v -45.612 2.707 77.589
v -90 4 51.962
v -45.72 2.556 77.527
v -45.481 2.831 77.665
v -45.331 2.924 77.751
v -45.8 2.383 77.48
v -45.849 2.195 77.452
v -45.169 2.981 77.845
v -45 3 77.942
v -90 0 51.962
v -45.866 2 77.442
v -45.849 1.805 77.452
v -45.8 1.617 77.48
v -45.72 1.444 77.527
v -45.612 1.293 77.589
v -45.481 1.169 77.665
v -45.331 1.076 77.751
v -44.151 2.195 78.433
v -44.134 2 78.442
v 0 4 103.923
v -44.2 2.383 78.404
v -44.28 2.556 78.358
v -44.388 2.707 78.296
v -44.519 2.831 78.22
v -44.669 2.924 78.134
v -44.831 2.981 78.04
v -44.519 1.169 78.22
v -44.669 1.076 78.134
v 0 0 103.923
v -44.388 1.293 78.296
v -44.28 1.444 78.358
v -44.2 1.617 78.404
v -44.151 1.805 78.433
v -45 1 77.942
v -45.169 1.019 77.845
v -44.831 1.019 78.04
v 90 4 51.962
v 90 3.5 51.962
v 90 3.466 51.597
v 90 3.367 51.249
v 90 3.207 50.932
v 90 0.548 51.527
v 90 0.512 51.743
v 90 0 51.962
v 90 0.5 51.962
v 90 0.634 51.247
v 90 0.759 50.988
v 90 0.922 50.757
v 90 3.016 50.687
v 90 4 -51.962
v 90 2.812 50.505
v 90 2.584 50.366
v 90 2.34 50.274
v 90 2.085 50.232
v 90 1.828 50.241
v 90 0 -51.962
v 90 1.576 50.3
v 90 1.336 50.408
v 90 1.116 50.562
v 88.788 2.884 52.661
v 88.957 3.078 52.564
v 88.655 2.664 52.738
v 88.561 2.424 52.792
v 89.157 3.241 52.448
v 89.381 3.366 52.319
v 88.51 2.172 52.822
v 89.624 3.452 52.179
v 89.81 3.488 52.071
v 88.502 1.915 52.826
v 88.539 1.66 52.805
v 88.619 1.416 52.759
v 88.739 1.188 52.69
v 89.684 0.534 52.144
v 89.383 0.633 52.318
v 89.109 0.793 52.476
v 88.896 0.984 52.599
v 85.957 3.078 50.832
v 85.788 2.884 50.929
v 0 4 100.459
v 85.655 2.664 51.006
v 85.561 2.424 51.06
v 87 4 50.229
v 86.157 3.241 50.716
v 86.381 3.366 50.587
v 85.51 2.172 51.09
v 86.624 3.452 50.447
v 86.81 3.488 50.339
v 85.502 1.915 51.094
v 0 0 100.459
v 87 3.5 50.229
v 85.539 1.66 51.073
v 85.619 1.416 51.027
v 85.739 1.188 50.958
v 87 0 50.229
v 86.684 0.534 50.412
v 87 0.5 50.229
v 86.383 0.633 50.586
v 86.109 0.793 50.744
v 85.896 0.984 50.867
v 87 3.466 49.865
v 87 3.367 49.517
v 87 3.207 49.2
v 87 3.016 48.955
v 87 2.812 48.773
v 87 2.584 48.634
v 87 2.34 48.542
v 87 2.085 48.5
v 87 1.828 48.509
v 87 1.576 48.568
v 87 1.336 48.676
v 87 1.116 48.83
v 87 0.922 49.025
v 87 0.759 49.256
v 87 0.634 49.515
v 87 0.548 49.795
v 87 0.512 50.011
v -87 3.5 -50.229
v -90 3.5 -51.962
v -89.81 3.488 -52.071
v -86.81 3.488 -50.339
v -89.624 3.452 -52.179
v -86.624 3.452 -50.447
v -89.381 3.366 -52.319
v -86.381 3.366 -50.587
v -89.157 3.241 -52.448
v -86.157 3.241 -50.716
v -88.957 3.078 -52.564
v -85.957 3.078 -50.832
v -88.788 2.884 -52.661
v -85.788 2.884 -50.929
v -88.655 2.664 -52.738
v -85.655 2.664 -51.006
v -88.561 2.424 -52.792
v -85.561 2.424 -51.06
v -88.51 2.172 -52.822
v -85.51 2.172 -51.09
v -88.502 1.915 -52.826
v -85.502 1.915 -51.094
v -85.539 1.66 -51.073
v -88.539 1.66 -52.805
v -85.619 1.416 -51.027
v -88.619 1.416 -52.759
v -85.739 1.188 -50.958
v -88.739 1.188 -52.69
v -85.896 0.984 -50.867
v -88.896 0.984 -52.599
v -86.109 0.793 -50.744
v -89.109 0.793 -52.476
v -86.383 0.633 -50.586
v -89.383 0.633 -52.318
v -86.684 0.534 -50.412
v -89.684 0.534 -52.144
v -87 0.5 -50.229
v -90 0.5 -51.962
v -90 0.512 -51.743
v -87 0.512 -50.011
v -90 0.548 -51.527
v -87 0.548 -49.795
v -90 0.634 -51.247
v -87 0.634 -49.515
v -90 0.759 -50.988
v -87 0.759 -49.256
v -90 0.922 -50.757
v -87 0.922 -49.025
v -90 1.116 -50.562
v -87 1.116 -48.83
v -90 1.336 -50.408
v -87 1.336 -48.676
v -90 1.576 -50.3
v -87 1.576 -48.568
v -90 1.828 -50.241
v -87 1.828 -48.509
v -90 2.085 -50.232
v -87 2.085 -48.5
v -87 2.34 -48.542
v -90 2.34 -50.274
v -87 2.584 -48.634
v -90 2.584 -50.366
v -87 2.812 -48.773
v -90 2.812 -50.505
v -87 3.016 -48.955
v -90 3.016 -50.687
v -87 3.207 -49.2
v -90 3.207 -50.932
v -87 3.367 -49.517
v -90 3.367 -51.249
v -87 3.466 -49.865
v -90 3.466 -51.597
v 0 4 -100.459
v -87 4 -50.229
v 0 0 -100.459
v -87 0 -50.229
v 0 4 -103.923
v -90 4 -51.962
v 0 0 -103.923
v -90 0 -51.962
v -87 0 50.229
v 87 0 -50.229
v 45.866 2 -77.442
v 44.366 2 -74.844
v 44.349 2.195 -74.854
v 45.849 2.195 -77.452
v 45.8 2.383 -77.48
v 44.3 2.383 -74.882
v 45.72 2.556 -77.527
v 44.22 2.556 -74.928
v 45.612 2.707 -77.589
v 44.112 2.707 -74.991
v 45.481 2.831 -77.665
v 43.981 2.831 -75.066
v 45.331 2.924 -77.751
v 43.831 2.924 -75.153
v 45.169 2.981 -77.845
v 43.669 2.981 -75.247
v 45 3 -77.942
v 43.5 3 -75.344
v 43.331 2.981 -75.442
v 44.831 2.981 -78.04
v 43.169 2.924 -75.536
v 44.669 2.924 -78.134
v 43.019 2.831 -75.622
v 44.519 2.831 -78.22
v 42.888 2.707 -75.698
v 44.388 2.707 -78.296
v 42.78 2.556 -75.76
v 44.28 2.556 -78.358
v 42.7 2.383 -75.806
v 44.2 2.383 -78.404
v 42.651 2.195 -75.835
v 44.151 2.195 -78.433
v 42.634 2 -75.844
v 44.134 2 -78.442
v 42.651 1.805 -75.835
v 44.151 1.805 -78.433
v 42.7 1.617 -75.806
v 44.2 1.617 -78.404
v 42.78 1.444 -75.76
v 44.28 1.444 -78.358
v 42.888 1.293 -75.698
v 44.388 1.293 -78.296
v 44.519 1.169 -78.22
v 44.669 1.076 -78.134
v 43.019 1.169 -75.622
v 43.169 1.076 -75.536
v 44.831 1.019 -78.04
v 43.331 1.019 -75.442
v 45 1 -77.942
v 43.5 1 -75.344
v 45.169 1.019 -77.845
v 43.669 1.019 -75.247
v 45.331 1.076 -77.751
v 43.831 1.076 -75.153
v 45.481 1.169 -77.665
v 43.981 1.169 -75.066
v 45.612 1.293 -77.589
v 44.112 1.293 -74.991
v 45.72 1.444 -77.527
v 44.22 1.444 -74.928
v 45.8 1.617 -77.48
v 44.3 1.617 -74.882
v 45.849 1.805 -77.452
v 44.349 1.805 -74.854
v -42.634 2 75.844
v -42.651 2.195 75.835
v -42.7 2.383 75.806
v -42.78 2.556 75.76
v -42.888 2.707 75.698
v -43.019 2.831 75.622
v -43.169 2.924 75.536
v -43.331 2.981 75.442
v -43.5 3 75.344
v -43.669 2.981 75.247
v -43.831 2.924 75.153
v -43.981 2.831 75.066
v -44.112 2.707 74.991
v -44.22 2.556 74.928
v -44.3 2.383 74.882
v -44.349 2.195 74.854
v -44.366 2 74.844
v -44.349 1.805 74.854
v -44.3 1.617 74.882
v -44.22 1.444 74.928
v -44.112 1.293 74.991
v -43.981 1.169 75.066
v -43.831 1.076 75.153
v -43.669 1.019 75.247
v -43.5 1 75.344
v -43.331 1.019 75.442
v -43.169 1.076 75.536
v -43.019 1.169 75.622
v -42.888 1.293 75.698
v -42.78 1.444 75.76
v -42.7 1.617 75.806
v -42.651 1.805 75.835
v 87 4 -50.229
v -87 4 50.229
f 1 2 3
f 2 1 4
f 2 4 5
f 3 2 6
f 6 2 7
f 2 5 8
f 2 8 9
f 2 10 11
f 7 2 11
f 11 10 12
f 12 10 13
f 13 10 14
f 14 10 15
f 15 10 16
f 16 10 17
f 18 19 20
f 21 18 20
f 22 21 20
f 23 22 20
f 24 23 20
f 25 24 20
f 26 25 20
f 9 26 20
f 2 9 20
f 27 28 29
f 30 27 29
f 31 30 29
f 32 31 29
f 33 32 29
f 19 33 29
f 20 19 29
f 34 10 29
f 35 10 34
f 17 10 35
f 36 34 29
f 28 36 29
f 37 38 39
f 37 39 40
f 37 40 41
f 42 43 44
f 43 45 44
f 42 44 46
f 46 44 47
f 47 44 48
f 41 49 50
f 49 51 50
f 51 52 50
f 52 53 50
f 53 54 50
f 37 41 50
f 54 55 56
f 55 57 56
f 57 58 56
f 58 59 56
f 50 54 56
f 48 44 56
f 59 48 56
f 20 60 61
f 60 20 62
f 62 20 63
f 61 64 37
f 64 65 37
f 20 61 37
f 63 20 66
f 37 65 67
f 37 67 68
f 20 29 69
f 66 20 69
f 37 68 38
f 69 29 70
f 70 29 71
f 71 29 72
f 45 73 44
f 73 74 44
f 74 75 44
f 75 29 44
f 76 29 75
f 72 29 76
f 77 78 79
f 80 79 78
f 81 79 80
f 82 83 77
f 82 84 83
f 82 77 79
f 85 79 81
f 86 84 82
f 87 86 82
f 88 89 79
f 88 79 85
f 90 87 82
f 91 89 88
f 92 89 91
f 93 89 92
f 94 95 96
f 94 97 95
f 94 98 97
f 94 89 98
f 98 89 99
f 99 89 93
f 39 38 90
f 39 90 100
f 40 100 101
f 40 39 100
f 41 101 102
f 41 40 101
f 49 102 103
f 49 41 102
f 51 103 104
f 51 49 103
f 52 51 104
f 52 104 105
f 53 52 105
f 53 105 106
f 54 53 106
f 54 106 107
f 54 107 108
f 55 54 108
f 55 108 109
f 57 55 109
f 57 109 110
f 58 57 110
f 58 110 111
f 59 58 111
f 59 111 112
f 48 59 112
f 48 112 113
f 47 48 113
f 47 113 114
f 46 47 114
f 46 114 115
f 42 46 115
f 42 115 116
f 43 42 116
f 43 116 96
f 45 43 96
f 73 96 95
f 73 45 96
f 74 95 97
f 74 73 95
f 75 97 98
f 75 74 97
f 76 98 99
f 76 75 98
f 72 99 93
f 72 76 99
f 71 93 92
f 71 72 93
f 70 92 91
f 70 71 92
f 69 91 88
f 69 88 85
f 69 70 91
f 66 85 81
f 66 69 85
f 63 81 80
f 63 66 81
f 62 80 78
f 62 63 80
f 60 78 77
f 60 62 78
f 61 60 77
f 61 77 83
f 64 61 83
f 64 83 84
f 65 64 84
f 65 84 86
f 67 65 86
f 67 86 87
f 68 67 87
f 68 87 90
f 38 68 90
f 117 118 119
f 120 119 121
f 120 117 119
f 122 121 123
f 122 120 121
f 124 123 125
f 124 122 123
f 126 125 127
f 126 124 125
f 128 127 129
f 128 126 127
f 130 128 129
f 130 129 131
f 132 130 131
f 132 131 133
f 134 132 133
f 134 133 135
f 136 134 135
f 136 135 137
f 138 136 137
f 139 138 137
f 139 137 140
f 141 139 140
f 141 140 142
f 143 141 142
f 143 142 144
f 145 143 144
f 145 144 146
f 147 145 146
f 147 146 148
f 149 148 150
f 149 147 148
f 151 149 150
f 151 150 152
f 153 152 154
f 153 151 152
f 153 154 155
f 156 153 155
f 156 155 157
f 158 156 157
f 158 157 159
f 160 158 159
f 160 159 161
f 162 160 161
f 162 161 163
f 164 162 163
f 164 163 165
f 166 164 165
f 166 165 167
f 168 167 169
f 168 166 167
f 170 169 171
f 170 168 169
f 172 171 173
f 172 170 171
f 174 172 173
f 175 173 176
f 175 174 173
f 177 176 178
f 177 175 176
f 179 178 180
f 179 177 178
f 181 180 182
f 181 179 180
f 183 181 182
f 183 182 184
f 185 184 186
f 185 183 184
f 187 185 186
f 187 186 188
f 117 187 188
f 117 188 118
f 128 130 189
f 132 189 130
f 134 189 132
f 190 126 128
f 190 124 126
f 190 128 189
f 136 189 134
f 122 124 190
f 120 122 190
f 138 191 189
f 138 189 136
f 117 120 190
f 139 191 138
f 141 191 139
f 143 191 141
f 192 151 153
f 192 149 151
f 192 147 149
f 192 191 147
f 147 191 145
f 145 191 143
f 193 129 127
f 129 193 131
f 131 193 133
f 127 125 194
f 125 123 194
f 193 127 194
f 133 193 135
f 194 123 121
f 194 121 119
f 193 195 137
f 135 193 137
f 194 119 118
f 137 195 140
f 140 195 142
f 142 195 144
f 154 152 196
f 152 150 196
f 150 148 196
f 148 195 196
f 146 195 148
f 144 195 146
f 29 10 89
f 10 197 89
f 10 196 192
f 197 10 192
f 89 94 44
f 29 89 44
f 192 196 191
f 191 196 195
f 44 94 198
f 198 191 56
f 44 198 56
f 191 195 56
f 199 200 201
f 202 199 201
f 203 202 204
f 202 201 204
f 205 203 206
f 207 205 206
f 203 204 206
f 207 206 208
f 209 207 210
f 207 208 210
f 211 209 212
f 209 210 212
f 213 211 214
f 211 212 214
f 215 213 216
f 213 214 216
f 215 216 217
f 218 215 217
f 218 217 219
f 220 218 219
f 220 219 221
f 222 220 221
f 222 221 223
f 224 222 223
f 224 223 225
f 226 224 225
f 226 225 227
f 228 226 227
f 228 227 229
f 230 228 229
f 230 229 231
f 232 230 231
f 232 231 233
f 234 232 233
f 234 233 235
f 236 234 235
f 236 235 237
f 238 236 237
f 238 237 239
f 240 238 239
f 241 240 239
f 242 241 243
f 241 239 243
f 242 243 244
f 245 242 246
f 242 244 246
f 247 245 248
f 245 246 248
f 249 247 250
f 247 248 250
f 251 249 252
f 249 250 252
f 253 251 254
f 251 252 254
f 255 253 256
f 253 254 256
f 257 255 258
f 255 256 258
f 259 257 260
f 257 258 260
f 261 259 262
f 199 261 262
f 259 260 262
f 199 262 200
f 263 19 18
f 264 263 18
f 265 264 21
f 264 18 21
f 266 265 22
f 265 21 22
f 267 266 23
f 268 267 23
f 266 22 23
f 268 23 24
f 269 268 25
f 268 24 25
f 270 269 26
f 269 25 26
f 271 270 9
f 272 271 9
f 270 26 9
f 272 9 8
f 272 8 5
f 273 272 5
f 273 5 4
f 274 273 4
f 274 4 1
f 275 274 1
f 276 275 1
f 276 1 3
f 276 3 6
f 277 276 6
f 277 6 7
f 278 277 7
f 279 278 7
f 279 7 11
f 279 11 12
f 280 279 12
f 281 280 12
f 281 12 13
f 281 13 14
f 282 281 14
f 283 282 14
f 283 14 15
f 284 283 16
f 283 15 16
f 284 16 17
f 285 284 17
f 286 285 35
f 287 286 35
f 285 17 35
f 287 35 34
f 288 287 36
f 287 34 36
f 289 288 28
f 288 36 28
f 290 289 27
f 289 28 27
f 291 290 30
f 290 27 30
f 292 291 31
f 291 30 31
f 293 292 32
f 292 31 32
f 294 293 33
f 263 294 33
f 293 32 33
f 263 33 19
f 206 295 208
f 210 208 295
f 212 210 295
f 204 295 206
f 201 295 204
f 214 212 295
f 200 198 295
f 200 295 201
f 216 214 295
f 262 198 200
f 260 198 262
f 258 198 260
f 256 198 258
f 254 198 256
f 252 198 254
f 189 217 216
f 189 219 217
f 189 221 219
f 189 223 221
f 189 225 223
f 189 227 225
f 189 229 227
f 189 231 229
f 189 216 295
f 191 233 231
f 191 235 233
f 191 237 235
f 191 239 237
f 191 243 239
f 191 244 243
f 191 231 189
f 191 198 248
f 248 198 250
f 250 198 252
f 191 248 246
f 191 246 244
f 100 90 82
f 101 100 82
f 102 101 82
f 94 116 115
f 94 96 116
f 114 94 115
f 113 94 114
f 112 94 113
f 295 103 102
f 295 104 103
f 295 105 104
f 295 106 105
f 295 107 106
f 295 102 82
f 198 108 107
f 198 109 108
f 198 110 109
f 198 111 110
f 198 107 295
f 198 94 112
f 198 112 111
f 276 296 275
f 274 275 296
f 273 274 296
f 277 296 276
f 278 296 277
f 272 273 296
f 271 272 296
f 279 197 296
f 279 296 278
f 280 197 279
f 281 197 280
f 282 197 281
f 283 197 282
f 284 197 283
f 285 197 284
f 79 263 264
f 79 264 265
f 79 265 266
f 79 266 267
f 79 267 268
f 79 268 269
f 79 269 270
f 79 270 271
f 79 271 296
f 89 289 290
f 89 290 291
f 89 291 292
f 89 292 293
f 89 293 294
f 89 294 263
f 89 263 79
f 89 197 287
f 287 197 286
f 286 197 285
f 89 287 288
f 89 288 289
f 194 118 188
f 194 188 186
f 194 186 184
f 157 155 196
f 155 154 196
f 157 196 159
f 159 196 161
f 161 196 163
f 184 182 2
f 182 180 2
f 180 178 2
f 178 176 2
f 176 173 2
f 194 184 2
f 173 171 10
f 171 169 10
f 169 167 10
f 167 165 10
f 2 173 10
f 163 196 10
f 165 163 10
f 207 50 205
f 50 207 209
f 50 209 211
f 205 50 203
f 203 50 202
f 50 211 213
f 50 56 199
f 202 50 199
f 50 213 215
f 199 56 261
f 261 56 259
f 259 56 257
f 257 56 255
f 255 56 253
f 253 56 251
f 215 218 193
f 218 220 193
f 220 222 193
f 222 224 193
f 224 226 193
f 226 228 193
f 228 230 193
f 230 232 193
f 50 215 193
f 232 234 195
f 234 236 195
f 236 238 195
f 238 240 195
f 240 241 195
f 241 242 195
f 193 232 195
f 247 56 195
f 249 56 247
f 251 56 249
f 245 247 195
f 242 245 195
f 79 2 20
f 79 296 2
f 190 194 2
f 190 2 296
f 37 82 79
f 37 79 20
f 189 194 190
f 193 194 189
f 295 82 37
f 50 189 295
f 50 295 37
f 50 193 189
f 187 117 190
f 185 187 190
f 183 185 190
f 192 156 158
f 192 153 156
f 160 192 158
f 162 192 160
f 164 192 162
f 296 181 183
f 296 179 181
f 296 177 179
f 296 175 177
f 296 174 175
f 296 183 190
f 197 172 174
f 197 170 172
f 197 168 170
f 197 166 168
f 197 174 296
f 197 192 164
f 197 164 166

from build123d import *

# Parameters (mm, degrees)
RESSALTO_EXTRUS_O1_DEPTH   = 4
ESBO_O2_R                  = 1
CORTE_EXTRUS_O1_DEPTH      = 227.530351
CORTE_EXTRUS_O2_DEPTH      = 186.712143
CORTE_EXTRUS_O2_DEPTH_BACK = 186.712143
ESBO_O3_R                  = 1.5


with BuildPart() as part:
    # Esboço1 → Ressalto-extrusão1 (new body)
    with BuildSketch(Plane(origin=(0, 0, 0), x_dir=(1, 0, 0), z_dir=(0, 1, 0))):
        Polygon((90, -51.961524), (90, 51.961524), (0, 103.923048), (-90, 51.961524), (-90, -51.961524), (0, -103.923048), align=None)
        Polygon((87, 50.229473), (0, 100.458947), (-87, 50.229473), (-87, -50.229473), (0, -100.458947), (87, -50.229473), align=None, mode=Mode.SUBTRACT)
    extrude(amount=RESSALTO_EXTRUS_O1_DEPTH)

    # Esboço2 → Corte-extrusão1 (cut, through all)
    with BuildSketch(Plane(origin=(-45, 0, 77.942286), x_dir=(0.8660254037844387, 0, 0.49999999999999994), z_dir=(-0.4999999999999999, 0, 0.8660254037844386))):
        with Locations((0, 2)):
            Circle(ESBO_O2_R)
    extrude(amount=-CORTE_EXTRUS_O1_DEPTH, mode=Mode.SUBTRACT)

    # Esboço3 → Corte-extrusão2 (cut, two sides: drawn at the far end of the back side and taken through both)
    with BuildSketch(Plane(origin=(-43.5, 0, -25.114737), x_dir=(-0.5, 0, 0.8660254037844386), z_dir=(-0.8660254037844387, 0, -0.5000000000000001)).offset(-CORTE_EXTRUS_O2_DEPTH_BACK)):
        with Locations(Location((0, 2, 0), (0, 0, 90))):
            Circle(ESBO_O3_R)
    extrude(amount=CORTE_EXTRUS_O2_DEPTH + CORTE_EXTRUS_O2_DEPTH_BACK, mode=Mode.SUBTRACT)


solid = part.part
